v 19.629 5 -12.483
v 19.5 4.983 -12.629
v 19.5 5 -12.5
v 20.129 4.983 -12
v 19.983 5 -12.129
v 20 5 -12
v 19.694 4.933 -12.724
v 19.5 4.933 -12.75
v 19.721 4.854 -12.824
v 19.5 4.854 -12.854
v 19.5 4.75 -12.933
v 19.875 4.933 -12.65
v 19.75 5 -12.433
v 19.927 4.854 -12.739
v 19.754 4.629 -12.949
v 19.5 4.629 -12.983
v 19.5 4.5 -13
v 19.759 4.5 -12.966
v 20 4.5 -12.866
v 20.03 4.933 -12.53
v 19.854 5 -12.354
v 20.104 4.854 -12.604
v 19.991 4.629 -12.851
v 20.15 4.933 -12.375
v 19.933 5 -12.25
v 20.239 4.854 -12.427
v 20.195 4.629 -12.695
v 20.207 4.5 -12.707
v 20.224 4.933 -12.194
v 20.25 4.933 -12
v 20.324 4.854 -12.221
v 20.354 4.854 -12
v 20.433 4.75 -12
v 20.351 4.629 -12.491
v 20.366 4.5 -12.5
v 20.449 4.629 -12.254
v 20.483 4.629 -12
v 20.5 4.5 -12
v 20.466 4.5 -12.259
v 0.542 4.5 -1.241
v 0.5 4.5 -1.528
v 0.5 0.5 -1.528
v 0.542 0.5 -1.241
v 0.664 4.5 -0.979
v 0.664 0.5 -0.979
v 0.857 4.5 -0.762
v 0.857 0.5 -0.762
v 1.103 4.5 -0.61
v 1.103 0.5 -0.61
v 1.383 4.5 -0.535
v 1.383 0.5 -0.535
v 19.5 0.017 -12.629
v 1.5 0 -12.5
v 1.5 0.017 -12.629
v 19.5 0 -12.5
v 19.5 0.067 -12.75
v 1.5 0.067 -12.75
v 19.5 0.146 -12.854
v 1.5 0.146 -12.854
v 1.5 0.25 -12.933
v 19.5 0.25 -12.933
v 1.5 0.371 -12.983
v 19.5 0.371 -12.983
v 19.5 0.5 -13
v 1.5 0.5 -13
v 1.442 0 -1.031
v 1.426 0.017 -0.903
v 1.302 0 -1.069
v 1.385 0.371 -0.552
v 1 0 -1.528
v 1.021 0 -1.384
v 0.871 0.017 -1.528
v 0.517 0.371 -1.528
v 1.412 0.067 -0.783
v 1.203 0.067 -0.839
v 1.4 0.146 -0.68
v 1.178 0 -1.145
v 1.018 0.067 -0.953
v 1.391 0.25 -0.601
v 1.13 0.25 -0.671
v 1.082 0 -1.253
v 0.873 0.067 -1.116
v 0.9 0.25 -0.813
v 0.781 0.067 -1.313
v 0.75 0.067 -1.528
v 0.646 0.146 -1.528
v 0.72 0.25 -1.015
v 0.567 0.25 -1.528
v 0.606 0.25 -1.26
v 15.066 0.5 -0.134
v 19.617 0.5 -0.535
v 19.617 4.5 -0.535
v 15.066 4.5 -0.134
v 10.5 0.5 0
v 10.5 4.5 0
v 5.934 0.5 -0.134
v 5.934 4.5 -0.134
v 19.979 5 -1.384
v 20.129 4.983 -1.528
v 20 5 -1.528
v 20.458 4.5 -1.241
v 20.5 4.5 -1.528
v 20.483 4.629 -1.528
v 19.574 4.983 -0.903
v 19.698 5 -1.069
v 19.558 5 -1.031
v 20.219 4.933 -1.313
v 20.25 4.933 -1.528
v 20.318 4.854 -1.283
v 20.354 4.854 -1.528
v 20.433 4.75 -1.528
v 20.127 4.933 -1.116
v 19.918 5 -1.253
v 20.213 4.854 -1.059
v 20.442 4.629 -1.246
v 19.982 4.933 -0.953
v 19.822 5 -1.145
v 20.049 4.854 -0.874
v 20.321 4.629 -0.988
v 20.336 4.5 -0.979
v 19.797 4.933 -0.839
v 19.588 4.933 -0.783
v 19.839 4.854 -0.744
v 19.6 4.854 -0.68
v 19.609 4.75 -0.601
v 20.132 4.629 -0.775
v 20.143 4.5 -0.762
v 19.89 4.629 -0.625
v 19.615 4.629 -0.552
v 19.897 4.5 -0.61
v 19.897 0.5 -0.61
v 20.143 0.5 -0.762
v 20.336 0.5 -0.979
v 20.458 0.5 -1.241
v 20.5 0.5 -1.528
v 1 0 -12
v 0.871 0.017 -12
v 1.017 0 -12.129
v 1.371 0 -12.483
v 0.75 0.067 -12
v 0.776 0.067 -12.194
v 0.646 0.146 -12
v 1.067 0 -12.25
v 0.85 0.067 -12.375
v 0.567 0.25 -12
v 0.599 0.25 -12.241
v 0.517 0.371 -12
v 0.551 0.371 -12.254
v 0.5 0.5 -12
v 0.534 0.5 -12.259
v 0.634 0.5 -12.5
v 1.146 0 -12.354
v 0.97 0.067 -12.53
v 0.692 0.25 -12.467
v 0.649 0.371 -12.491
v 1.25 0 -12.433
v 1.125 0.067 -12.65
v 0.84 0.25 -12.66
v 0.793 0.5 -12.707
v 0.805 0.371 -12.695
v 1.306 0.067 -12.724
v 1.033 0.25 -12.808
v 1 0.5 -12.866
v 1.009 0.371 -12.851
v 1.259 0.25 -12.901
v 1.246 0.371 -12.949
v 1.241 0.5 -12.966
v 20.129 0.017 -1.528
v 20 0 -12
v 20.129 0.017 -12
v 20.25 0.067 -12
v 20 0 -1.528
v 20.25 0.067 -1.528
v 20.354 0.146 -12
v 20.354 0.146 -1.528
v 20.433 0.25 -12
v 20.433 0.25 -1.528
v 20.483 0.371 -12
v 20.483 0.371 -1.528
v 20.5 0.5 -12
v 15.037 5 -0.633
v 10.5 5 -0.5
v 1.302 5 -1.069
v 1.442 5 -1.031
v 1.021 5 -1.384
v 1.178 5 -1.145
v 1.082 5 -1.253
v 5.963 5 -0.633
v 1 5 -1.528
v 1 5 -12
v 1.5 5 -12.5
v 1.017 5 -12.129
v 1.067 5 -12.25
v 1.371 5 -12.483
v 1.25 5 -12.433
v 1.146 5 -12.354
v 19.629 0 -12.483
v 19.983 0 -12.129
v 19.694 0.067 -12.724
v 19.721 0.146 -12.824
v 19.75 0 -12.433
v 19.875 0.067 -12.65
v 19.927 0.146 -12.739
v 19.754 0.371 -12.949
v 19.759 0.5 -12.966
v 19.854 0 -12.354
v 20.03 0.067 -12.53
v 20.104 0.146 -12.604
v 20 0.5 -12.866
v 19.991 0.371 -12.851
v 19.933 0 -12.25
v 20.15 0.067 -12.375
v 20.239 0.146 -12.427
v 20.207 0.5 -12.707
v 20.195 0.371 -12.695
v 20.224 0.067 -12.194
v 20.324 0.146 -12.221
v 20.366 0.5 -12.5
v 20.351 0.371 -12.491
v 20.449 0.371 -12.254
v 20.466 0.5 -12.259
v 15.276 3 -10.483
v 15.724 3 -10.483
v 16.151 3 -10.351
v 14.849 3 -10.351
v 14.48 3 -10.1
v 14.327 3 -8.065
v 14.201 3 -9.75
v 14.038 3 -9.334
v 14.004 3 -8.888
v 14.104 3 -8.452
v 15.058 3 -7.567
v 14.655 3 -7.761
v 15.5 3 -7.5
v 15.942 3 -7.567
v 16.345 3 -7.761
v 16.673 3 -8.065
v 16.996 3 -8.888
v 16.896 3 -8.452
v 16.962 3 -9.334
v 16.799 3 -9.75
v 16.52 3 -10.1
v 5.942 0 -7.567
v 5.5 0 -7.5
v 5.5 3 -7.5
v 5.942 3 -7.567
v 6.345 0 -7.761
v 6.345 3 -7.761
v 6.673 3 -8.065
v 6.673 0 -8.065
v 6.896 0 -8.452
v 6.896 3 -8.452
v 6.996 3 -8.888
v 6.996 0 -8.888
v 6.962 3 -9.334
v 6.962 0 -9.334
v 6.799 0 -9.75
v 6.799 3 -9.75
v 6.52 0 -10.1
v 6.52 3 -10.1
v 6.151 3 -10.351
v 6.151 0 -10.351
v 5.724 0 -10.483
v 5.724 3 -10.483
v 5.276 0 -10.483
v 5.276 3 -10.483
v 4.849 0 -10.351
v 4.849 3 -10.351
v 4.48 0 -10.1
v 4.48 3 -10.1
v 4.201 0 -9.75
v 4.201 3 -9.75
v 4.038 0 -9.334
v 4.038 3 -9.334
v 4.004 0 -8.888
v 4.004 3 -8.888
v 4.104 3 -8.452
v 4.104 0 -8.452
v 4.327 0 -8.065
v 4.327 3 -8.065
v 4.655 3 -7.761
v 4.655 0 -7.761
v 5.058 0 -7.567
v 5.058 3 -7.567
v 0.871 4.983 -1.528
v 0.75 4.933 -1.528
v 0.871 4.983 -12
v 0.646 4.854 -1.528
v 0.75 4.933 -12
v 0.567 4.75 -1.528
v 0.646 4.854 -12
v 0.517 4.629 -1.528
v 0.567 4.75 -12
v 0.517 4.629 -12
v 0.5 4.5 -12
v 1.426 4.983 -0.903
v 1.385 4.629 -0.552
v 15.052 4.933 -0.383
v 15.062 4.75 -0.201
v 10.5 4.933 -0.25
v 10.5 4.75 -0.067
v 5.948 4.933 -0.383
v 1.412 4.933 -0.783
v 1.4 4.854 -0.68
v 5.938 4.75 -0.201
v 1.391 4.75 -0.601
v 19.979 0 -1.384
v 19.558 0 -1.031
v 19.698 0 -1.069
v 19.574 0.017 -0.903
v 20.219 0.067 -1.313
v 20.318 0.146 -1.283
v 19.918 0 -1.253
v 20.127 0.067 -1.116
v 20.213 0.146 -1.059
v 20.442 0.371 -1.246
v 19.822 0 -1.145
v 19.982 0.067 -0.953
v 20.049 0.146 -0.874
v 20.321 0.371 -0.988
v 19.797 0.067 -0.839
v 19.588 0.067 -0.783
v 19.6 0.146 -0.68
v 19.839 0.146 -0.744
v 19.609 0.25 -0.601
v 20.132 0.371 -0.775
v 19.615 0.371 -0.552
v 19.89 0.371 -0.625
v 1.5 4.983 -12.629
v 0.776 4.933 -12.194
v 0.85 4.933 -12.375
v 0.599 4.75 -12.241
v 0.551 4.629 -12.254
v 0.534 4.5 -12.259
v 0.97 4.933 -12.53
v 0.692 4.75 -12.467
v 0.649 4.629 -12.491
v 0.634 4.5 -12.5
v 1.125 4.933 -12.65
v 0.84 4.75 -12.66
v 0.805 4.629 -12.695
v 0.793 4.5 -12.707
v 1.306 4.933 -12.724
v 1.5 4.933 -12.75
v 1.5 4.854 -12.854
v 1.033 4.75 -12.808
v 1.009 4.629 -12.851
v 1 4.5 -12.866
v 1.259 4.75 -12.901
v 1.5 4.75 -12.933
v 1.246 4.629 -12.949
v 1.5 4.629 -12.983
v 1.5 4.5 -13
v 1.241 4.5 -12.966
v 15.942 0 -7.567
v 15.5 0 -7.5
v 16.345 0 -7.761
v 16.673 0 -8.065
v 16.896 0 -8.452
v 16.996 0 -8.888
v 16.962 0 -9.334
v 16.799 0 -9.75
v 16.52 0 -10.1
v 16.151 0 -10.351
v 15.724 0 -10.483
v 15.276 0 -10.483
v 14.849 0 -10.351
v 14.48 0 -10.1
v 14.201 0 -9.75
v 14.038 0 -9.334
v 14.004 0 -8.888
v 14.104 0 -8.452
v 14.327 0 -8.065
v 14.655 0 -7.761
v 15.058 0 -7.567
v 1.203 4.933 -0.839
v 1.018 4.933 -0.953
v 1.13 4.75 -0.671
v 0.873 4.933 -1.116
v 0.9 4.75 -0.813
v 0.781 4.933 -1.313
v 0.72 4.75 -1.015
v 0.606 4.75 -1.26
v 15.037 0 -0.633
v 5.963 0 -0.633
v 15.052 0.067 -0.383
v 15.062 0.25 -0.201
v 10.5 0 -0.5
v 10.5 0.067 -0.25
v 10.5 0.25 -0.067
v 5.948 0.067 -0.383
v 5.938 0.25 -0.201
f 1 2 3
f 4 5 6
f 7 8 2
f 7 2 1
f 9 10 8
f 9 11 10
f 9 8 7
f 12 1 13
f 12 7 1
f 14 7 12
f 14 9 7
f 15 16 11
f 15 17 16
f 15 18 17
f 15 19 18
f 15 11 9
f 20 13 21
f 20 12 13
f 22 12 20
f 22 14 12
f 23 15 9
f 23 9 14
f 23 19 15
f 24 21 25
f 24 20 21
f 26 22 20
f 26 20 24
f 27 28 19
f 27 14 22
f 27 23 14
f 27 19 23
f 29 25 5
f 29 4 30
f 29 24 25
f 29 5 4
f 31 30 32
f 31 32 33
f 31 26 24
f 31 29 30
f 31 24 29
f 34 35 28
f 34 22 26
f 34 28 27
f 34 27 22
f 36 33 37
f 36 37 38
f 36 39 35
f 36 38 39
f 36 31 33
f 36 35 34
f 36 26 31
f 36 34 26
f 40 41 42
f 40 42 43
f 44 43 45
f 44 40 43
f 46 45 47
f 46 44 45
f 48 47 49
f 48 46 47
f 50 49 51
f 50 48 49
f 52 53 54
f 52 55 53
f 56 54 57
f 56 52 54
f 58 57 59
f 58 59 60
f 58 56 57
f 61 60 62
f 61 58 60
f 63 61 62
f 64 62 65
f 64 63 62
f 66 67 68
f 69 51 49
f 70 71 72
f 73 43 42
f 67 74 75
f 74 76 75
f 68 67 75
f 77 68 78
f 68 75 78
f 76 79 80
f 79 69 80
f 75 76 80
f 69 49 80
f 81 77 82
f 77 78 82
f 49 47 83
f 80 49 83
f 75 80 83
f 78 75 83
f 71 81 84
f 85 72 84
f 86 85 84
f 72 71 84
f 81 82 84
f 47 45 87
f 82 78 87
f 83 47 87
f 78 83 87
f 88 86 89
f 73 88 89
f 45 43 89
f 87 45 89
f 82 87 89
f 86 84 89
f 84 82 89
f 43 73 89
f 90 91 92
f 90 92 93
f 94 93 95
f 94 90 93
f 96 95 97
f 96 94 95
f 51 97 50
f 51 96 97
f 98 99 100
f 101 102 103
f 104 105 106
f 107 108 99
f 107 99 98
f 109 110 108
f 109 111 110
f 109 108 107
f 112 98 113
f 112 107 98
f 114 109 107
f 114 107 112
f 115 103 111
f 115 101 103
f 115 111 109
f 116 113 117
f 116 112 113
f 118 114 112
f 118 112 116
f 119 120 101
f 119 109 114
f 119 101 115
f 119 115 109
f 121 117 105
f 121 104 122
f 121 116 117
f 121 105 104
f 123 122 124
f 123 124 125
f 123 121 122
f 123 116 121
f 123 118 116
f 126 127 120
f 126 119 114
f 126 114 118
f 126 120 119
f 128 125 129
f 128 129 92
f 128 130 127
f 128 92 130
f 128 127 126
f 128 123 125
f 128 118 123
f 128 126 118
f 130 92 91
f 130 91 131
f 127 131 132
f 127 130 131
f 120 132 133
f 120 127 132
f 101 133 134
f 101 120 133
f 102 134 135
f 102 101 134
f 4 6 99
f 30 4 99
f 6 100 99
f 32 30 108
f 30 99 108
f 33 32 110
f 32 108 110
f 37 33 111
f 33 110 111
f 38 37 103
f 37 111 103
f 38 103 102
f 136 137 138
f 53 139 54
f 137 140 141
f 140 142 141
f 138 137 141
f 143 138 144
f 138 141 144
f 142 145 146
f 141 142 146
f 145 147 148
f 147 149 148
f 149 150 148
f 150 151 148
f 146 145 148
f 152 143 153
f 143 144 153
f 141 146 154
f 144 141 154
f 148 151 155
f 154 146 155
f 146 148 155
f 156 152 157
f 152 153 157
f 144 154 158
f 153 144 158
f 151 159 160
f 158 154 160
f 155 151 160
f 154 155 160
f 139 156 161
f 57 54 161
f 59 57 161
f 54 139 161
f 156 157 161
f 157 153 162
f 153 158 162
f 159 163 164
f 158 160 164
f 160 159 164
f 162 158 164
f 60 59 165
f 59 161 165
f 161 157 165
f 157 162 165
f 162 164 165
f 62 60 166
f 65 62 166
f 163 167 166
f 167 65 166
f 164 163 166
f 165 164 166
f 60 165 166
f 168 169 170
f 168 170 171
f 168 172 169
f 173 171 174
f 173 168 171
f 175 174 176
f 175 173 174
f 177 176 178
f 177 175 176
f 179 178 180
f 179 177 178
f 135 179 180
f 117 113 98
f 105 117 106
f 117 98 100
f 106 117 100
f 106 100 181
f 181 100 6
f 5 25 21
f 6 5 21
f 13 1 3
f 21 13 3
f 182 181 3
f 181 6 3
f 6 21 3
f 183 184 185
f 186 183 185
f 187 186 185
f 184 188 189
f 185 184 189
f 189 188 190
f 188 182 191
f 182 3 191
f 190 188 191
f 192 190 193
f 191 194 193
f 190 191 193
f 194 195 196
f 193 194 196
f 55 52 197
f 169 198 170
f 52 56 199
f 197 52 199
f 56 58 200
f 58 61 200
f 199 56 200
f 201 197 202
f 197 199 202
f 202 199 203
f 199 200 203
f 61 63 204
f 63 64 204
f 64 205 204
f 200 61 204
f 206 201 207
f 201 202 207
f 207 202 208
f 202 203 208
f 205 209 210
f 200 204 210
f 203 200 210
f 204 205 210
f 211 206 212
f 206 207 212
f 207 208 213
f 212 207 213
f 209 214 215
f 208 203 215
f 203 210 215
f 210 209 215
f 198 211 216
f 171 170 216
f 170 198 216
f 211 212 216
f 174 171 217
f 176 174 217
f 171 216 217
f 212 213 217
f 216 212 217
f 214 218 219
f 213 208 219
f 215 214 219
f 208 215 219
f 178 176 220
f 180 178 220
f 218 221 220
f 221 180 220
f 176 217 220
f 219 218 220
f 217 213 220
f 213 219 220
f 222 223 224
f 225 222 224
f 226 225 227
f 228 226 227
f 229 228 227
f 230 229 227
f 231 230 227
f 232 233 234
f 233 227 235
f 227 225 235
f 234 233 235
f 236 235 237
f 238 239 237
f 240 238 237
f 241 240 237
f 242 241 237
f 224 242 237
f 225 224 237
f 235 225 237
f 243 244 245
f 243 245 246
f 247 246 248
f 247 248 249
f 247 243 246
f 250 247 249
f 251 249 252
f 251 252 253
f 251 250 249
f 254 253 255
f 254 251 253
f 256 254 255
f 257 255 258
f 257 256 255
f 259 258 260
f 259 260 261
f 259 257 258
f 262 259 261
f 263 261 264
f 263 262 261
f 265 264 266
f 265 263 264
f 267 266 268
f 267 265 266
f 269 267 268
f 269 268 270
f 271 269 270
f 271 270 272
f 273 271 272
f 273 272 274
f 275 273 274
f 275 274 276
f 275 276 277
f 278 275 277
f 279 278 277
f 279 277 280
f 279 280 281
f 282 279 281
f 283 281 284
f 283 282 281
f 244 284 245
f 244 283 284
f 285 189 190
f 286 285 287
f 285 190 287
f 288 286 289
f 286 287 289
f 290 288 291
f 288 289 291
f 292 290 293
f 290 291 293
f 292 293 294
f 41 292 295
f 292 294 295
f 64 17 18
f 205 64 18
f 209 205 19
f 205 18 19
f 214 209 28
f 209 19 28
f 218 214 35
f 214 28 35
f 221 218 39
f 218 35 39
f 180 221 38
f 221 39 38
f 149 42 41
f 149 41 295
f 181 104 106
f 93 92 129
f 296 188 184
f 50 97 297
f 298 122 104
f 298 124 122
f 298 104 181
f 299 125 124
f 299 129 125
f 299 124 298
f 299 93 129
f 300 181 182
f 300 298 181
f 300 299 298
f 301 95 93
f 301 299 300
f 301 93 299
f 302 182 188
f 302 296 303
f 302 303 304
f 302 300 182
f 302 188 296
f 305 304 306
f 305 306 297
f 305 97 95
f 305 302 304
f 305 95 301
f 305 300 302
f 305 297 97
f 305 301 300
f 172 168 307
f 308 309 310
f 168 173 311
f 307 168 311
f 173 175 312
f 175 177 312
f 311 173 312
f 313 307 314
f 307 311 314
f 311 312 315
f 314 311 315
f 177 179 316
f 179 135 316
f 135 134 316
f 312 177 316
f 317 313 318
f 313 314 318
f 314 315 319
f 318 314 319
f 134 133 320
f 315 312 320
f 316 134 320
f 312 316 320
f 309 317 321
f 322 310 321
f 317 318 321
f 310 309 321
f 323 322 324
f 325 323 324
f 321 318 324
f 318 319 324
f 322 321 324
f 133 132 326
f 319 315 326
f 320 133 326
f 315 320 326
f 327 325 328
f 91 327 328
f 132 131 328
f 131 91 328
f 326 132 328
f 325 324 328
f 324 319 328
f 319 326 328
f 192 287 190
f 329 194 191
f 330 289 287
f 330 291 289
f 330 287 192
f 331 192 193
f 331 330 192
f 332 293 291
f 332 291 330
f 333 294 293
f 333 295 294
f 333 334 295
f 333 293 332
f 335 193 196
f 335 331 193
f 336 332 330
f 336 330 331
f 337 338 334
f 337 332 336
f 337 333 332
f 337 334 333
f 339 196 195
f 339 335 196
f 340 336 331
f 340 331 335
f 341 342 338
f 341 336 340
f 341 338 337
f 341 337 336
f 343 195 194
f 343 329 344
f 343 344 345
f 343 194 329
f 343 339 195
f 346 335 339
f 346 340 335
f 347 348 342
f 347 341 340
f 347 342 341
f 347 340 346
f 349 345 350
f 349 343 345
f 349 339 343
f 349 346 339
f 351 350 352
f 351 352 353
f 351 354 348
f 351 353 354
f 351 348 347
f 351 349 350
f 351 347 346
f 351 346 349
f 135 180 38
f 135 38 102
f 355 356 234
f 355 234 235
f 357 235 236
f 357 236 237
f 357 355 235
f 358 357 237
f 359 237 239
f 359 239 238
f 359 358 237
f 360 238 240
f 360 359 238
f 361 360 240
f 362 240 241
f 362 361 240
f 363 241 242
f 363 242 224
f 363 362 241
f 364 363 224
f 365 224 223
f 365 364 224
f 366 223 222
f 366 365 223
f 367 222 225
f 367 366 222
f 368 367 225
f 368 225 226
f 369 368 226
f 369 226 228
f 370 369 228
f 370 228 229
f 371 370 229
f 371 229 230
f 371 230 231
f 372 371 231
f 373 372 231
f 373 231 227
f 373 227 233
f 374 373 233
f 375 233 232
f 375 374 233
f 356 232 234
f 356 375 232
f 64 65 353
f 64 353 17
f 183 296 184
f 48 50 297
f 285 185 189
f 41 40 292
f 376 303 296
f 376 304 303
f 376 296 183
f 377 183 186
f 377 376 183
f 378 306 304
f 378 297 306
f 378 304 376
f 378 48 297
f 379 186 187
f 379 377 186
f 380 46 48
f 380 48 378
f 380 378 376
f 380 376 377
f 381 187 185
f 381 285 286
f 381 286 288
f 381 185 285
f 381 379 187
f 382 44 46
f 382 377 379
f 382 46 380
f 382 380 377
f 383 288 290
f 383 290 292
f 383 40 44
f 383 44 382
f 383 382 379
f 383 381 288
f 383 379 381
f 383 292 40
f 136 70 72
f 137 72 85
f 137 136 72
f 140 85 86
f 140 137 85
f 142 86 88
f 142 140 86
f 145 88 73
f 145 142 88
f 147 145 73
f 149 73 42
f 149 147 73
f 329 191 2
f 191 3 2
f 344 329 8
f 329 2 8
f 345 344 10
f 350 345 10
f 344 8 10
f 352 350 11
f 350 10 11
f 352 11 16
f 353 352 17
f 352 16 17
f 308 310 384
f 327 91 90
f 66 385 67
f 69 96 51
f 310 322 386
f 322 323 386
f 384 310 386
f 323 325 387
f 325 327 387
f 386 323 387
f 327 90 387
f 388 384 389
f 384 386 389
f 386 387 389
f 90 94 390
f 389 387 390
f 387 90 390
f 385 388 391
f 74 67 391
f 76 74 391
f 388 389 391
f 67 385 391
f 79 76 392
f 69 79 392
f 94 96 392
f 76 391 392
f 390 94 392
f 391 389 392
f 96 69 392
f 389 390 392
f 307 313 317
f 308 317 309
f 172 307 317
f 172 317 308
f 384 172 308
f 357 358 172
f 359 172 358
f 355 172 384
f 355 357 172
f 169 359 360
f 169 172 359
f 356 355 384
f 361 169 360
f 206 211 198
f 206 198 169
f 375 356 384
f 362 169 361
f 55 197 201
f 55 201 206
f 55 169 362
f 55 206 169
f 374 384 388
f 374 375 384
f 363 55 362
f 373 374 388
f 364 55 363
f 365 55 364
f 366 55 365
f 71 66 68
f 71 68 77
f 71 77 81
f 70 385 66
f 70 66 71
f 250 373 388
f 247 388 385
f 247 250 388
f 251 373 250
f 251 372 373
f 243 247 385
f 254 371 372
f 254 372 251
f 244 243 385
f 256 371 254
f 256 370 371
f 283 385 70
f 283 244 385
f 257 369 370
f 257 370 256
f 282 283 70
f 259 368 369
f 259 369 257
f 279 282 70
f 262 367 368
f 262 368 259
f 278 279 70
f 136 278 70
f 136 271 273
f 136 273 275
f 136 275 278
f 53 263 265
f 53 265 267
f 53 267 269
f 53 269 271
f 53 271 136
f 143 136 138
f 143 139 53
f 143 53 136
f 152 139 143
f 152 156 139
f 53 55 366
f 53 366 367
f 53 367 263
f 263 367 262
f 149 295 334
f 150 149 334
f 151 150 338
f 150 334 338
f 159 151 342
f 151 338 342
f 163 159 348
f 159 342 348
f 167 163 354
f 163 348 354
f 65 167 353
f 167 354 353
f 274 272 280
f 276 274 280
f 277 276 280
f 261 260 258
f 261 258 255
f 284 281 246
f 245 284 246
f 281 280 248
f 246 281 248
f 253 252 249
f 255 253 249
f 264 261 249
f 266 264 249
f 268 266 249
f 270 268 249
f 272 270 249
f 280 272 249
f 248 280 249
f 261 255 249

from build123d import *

# Parameters (mm, degrees)
BOSS_EXTRUDE1_DEPTH = 5
SKETCH1_3_R         = 1.5
CUT_EXTRUDE1_DEPTH  = 3
FILLET1_R           = 1
FILLET2_R           = 0.5


with BuildPart() as part:
    # Sketch1 → Boss-Extrude1 (new body)
    with BuildSketch(Plane(origin=(0, 0, 0), x_dir=(1, 0, 0), z_dir=(0, 1, 0))):
        with BuildLine():
            Line((0.5, 0.643681577), (0.5, 13))
            Line((0.5, 13), (20.5, 13))
            Line((20.5, 13), (20.5, 0.643681577))
            ThreePointArc((20.5, 0.643681577), (10.5, 0), (0.5, 0.643681577))
        make_face()
    extrude(amount=BOSS_EXTRUDE1_DEPTH)

    # Sketch1<3> → Cut-Extrude1 (cut)
    with BuildSketch(Plane(origin=(0, 0, 0), x_dir=(1, 0, 0), z_dir=(0, 1, 0))):
        with Locations((5.5, 9)):
            Circle(SKETCH1_3_R)
        with Locations((15.5, 9)):
            Circle(SKETCH1_3_R)
    extrude(amount=CUT_EXTRUDE1_DEPTH, mode=Mode.SUBTRACT)

    # Fillet1
    fillet1_edges = [part.edges().sort_by_distance(p)[0] for p in [
        (20.5, 2.5, -13),
        (0.5, 2.5, -13),
        (20.5, 2.5, -0.643681577),
        (0.5, 2.5, -0.643681577),
    ]]
    fillet(fillet1_edges, radius=FILLET1_R)

    # Fillet2
    fillet2_edges = [part.edges().sort_by_distance(p)[0] for p in [
        (0.792893219, 0, -12.707106781),
        (0.5, 0, -6.763891411),
        (20.5, 0, -6.763891411),
        (20.207106781, 0, -12.707106781),
        (0.792893219, 5, -12.707106781),
        (0.5, 5, -6.763891411),
        (20.5, 5, -6.763891411),
        (20.207106781, 5, -12.707106781),
        (10.5, 0, -13),
        (10.5, 5, -13),
        (0.752710526, 0, -0.863284184),
        (10.5, 0, 0),
        (20.247289474, 0, -0.863284184),
        (0.752710526, 5, -0.863284184),
        (10.5, 5, 0),
        (20.247289474, 5, -0.863284184),
    ]]
    fillet(fillet2_edges, radius=FILLET2_R)


solid = part.part
